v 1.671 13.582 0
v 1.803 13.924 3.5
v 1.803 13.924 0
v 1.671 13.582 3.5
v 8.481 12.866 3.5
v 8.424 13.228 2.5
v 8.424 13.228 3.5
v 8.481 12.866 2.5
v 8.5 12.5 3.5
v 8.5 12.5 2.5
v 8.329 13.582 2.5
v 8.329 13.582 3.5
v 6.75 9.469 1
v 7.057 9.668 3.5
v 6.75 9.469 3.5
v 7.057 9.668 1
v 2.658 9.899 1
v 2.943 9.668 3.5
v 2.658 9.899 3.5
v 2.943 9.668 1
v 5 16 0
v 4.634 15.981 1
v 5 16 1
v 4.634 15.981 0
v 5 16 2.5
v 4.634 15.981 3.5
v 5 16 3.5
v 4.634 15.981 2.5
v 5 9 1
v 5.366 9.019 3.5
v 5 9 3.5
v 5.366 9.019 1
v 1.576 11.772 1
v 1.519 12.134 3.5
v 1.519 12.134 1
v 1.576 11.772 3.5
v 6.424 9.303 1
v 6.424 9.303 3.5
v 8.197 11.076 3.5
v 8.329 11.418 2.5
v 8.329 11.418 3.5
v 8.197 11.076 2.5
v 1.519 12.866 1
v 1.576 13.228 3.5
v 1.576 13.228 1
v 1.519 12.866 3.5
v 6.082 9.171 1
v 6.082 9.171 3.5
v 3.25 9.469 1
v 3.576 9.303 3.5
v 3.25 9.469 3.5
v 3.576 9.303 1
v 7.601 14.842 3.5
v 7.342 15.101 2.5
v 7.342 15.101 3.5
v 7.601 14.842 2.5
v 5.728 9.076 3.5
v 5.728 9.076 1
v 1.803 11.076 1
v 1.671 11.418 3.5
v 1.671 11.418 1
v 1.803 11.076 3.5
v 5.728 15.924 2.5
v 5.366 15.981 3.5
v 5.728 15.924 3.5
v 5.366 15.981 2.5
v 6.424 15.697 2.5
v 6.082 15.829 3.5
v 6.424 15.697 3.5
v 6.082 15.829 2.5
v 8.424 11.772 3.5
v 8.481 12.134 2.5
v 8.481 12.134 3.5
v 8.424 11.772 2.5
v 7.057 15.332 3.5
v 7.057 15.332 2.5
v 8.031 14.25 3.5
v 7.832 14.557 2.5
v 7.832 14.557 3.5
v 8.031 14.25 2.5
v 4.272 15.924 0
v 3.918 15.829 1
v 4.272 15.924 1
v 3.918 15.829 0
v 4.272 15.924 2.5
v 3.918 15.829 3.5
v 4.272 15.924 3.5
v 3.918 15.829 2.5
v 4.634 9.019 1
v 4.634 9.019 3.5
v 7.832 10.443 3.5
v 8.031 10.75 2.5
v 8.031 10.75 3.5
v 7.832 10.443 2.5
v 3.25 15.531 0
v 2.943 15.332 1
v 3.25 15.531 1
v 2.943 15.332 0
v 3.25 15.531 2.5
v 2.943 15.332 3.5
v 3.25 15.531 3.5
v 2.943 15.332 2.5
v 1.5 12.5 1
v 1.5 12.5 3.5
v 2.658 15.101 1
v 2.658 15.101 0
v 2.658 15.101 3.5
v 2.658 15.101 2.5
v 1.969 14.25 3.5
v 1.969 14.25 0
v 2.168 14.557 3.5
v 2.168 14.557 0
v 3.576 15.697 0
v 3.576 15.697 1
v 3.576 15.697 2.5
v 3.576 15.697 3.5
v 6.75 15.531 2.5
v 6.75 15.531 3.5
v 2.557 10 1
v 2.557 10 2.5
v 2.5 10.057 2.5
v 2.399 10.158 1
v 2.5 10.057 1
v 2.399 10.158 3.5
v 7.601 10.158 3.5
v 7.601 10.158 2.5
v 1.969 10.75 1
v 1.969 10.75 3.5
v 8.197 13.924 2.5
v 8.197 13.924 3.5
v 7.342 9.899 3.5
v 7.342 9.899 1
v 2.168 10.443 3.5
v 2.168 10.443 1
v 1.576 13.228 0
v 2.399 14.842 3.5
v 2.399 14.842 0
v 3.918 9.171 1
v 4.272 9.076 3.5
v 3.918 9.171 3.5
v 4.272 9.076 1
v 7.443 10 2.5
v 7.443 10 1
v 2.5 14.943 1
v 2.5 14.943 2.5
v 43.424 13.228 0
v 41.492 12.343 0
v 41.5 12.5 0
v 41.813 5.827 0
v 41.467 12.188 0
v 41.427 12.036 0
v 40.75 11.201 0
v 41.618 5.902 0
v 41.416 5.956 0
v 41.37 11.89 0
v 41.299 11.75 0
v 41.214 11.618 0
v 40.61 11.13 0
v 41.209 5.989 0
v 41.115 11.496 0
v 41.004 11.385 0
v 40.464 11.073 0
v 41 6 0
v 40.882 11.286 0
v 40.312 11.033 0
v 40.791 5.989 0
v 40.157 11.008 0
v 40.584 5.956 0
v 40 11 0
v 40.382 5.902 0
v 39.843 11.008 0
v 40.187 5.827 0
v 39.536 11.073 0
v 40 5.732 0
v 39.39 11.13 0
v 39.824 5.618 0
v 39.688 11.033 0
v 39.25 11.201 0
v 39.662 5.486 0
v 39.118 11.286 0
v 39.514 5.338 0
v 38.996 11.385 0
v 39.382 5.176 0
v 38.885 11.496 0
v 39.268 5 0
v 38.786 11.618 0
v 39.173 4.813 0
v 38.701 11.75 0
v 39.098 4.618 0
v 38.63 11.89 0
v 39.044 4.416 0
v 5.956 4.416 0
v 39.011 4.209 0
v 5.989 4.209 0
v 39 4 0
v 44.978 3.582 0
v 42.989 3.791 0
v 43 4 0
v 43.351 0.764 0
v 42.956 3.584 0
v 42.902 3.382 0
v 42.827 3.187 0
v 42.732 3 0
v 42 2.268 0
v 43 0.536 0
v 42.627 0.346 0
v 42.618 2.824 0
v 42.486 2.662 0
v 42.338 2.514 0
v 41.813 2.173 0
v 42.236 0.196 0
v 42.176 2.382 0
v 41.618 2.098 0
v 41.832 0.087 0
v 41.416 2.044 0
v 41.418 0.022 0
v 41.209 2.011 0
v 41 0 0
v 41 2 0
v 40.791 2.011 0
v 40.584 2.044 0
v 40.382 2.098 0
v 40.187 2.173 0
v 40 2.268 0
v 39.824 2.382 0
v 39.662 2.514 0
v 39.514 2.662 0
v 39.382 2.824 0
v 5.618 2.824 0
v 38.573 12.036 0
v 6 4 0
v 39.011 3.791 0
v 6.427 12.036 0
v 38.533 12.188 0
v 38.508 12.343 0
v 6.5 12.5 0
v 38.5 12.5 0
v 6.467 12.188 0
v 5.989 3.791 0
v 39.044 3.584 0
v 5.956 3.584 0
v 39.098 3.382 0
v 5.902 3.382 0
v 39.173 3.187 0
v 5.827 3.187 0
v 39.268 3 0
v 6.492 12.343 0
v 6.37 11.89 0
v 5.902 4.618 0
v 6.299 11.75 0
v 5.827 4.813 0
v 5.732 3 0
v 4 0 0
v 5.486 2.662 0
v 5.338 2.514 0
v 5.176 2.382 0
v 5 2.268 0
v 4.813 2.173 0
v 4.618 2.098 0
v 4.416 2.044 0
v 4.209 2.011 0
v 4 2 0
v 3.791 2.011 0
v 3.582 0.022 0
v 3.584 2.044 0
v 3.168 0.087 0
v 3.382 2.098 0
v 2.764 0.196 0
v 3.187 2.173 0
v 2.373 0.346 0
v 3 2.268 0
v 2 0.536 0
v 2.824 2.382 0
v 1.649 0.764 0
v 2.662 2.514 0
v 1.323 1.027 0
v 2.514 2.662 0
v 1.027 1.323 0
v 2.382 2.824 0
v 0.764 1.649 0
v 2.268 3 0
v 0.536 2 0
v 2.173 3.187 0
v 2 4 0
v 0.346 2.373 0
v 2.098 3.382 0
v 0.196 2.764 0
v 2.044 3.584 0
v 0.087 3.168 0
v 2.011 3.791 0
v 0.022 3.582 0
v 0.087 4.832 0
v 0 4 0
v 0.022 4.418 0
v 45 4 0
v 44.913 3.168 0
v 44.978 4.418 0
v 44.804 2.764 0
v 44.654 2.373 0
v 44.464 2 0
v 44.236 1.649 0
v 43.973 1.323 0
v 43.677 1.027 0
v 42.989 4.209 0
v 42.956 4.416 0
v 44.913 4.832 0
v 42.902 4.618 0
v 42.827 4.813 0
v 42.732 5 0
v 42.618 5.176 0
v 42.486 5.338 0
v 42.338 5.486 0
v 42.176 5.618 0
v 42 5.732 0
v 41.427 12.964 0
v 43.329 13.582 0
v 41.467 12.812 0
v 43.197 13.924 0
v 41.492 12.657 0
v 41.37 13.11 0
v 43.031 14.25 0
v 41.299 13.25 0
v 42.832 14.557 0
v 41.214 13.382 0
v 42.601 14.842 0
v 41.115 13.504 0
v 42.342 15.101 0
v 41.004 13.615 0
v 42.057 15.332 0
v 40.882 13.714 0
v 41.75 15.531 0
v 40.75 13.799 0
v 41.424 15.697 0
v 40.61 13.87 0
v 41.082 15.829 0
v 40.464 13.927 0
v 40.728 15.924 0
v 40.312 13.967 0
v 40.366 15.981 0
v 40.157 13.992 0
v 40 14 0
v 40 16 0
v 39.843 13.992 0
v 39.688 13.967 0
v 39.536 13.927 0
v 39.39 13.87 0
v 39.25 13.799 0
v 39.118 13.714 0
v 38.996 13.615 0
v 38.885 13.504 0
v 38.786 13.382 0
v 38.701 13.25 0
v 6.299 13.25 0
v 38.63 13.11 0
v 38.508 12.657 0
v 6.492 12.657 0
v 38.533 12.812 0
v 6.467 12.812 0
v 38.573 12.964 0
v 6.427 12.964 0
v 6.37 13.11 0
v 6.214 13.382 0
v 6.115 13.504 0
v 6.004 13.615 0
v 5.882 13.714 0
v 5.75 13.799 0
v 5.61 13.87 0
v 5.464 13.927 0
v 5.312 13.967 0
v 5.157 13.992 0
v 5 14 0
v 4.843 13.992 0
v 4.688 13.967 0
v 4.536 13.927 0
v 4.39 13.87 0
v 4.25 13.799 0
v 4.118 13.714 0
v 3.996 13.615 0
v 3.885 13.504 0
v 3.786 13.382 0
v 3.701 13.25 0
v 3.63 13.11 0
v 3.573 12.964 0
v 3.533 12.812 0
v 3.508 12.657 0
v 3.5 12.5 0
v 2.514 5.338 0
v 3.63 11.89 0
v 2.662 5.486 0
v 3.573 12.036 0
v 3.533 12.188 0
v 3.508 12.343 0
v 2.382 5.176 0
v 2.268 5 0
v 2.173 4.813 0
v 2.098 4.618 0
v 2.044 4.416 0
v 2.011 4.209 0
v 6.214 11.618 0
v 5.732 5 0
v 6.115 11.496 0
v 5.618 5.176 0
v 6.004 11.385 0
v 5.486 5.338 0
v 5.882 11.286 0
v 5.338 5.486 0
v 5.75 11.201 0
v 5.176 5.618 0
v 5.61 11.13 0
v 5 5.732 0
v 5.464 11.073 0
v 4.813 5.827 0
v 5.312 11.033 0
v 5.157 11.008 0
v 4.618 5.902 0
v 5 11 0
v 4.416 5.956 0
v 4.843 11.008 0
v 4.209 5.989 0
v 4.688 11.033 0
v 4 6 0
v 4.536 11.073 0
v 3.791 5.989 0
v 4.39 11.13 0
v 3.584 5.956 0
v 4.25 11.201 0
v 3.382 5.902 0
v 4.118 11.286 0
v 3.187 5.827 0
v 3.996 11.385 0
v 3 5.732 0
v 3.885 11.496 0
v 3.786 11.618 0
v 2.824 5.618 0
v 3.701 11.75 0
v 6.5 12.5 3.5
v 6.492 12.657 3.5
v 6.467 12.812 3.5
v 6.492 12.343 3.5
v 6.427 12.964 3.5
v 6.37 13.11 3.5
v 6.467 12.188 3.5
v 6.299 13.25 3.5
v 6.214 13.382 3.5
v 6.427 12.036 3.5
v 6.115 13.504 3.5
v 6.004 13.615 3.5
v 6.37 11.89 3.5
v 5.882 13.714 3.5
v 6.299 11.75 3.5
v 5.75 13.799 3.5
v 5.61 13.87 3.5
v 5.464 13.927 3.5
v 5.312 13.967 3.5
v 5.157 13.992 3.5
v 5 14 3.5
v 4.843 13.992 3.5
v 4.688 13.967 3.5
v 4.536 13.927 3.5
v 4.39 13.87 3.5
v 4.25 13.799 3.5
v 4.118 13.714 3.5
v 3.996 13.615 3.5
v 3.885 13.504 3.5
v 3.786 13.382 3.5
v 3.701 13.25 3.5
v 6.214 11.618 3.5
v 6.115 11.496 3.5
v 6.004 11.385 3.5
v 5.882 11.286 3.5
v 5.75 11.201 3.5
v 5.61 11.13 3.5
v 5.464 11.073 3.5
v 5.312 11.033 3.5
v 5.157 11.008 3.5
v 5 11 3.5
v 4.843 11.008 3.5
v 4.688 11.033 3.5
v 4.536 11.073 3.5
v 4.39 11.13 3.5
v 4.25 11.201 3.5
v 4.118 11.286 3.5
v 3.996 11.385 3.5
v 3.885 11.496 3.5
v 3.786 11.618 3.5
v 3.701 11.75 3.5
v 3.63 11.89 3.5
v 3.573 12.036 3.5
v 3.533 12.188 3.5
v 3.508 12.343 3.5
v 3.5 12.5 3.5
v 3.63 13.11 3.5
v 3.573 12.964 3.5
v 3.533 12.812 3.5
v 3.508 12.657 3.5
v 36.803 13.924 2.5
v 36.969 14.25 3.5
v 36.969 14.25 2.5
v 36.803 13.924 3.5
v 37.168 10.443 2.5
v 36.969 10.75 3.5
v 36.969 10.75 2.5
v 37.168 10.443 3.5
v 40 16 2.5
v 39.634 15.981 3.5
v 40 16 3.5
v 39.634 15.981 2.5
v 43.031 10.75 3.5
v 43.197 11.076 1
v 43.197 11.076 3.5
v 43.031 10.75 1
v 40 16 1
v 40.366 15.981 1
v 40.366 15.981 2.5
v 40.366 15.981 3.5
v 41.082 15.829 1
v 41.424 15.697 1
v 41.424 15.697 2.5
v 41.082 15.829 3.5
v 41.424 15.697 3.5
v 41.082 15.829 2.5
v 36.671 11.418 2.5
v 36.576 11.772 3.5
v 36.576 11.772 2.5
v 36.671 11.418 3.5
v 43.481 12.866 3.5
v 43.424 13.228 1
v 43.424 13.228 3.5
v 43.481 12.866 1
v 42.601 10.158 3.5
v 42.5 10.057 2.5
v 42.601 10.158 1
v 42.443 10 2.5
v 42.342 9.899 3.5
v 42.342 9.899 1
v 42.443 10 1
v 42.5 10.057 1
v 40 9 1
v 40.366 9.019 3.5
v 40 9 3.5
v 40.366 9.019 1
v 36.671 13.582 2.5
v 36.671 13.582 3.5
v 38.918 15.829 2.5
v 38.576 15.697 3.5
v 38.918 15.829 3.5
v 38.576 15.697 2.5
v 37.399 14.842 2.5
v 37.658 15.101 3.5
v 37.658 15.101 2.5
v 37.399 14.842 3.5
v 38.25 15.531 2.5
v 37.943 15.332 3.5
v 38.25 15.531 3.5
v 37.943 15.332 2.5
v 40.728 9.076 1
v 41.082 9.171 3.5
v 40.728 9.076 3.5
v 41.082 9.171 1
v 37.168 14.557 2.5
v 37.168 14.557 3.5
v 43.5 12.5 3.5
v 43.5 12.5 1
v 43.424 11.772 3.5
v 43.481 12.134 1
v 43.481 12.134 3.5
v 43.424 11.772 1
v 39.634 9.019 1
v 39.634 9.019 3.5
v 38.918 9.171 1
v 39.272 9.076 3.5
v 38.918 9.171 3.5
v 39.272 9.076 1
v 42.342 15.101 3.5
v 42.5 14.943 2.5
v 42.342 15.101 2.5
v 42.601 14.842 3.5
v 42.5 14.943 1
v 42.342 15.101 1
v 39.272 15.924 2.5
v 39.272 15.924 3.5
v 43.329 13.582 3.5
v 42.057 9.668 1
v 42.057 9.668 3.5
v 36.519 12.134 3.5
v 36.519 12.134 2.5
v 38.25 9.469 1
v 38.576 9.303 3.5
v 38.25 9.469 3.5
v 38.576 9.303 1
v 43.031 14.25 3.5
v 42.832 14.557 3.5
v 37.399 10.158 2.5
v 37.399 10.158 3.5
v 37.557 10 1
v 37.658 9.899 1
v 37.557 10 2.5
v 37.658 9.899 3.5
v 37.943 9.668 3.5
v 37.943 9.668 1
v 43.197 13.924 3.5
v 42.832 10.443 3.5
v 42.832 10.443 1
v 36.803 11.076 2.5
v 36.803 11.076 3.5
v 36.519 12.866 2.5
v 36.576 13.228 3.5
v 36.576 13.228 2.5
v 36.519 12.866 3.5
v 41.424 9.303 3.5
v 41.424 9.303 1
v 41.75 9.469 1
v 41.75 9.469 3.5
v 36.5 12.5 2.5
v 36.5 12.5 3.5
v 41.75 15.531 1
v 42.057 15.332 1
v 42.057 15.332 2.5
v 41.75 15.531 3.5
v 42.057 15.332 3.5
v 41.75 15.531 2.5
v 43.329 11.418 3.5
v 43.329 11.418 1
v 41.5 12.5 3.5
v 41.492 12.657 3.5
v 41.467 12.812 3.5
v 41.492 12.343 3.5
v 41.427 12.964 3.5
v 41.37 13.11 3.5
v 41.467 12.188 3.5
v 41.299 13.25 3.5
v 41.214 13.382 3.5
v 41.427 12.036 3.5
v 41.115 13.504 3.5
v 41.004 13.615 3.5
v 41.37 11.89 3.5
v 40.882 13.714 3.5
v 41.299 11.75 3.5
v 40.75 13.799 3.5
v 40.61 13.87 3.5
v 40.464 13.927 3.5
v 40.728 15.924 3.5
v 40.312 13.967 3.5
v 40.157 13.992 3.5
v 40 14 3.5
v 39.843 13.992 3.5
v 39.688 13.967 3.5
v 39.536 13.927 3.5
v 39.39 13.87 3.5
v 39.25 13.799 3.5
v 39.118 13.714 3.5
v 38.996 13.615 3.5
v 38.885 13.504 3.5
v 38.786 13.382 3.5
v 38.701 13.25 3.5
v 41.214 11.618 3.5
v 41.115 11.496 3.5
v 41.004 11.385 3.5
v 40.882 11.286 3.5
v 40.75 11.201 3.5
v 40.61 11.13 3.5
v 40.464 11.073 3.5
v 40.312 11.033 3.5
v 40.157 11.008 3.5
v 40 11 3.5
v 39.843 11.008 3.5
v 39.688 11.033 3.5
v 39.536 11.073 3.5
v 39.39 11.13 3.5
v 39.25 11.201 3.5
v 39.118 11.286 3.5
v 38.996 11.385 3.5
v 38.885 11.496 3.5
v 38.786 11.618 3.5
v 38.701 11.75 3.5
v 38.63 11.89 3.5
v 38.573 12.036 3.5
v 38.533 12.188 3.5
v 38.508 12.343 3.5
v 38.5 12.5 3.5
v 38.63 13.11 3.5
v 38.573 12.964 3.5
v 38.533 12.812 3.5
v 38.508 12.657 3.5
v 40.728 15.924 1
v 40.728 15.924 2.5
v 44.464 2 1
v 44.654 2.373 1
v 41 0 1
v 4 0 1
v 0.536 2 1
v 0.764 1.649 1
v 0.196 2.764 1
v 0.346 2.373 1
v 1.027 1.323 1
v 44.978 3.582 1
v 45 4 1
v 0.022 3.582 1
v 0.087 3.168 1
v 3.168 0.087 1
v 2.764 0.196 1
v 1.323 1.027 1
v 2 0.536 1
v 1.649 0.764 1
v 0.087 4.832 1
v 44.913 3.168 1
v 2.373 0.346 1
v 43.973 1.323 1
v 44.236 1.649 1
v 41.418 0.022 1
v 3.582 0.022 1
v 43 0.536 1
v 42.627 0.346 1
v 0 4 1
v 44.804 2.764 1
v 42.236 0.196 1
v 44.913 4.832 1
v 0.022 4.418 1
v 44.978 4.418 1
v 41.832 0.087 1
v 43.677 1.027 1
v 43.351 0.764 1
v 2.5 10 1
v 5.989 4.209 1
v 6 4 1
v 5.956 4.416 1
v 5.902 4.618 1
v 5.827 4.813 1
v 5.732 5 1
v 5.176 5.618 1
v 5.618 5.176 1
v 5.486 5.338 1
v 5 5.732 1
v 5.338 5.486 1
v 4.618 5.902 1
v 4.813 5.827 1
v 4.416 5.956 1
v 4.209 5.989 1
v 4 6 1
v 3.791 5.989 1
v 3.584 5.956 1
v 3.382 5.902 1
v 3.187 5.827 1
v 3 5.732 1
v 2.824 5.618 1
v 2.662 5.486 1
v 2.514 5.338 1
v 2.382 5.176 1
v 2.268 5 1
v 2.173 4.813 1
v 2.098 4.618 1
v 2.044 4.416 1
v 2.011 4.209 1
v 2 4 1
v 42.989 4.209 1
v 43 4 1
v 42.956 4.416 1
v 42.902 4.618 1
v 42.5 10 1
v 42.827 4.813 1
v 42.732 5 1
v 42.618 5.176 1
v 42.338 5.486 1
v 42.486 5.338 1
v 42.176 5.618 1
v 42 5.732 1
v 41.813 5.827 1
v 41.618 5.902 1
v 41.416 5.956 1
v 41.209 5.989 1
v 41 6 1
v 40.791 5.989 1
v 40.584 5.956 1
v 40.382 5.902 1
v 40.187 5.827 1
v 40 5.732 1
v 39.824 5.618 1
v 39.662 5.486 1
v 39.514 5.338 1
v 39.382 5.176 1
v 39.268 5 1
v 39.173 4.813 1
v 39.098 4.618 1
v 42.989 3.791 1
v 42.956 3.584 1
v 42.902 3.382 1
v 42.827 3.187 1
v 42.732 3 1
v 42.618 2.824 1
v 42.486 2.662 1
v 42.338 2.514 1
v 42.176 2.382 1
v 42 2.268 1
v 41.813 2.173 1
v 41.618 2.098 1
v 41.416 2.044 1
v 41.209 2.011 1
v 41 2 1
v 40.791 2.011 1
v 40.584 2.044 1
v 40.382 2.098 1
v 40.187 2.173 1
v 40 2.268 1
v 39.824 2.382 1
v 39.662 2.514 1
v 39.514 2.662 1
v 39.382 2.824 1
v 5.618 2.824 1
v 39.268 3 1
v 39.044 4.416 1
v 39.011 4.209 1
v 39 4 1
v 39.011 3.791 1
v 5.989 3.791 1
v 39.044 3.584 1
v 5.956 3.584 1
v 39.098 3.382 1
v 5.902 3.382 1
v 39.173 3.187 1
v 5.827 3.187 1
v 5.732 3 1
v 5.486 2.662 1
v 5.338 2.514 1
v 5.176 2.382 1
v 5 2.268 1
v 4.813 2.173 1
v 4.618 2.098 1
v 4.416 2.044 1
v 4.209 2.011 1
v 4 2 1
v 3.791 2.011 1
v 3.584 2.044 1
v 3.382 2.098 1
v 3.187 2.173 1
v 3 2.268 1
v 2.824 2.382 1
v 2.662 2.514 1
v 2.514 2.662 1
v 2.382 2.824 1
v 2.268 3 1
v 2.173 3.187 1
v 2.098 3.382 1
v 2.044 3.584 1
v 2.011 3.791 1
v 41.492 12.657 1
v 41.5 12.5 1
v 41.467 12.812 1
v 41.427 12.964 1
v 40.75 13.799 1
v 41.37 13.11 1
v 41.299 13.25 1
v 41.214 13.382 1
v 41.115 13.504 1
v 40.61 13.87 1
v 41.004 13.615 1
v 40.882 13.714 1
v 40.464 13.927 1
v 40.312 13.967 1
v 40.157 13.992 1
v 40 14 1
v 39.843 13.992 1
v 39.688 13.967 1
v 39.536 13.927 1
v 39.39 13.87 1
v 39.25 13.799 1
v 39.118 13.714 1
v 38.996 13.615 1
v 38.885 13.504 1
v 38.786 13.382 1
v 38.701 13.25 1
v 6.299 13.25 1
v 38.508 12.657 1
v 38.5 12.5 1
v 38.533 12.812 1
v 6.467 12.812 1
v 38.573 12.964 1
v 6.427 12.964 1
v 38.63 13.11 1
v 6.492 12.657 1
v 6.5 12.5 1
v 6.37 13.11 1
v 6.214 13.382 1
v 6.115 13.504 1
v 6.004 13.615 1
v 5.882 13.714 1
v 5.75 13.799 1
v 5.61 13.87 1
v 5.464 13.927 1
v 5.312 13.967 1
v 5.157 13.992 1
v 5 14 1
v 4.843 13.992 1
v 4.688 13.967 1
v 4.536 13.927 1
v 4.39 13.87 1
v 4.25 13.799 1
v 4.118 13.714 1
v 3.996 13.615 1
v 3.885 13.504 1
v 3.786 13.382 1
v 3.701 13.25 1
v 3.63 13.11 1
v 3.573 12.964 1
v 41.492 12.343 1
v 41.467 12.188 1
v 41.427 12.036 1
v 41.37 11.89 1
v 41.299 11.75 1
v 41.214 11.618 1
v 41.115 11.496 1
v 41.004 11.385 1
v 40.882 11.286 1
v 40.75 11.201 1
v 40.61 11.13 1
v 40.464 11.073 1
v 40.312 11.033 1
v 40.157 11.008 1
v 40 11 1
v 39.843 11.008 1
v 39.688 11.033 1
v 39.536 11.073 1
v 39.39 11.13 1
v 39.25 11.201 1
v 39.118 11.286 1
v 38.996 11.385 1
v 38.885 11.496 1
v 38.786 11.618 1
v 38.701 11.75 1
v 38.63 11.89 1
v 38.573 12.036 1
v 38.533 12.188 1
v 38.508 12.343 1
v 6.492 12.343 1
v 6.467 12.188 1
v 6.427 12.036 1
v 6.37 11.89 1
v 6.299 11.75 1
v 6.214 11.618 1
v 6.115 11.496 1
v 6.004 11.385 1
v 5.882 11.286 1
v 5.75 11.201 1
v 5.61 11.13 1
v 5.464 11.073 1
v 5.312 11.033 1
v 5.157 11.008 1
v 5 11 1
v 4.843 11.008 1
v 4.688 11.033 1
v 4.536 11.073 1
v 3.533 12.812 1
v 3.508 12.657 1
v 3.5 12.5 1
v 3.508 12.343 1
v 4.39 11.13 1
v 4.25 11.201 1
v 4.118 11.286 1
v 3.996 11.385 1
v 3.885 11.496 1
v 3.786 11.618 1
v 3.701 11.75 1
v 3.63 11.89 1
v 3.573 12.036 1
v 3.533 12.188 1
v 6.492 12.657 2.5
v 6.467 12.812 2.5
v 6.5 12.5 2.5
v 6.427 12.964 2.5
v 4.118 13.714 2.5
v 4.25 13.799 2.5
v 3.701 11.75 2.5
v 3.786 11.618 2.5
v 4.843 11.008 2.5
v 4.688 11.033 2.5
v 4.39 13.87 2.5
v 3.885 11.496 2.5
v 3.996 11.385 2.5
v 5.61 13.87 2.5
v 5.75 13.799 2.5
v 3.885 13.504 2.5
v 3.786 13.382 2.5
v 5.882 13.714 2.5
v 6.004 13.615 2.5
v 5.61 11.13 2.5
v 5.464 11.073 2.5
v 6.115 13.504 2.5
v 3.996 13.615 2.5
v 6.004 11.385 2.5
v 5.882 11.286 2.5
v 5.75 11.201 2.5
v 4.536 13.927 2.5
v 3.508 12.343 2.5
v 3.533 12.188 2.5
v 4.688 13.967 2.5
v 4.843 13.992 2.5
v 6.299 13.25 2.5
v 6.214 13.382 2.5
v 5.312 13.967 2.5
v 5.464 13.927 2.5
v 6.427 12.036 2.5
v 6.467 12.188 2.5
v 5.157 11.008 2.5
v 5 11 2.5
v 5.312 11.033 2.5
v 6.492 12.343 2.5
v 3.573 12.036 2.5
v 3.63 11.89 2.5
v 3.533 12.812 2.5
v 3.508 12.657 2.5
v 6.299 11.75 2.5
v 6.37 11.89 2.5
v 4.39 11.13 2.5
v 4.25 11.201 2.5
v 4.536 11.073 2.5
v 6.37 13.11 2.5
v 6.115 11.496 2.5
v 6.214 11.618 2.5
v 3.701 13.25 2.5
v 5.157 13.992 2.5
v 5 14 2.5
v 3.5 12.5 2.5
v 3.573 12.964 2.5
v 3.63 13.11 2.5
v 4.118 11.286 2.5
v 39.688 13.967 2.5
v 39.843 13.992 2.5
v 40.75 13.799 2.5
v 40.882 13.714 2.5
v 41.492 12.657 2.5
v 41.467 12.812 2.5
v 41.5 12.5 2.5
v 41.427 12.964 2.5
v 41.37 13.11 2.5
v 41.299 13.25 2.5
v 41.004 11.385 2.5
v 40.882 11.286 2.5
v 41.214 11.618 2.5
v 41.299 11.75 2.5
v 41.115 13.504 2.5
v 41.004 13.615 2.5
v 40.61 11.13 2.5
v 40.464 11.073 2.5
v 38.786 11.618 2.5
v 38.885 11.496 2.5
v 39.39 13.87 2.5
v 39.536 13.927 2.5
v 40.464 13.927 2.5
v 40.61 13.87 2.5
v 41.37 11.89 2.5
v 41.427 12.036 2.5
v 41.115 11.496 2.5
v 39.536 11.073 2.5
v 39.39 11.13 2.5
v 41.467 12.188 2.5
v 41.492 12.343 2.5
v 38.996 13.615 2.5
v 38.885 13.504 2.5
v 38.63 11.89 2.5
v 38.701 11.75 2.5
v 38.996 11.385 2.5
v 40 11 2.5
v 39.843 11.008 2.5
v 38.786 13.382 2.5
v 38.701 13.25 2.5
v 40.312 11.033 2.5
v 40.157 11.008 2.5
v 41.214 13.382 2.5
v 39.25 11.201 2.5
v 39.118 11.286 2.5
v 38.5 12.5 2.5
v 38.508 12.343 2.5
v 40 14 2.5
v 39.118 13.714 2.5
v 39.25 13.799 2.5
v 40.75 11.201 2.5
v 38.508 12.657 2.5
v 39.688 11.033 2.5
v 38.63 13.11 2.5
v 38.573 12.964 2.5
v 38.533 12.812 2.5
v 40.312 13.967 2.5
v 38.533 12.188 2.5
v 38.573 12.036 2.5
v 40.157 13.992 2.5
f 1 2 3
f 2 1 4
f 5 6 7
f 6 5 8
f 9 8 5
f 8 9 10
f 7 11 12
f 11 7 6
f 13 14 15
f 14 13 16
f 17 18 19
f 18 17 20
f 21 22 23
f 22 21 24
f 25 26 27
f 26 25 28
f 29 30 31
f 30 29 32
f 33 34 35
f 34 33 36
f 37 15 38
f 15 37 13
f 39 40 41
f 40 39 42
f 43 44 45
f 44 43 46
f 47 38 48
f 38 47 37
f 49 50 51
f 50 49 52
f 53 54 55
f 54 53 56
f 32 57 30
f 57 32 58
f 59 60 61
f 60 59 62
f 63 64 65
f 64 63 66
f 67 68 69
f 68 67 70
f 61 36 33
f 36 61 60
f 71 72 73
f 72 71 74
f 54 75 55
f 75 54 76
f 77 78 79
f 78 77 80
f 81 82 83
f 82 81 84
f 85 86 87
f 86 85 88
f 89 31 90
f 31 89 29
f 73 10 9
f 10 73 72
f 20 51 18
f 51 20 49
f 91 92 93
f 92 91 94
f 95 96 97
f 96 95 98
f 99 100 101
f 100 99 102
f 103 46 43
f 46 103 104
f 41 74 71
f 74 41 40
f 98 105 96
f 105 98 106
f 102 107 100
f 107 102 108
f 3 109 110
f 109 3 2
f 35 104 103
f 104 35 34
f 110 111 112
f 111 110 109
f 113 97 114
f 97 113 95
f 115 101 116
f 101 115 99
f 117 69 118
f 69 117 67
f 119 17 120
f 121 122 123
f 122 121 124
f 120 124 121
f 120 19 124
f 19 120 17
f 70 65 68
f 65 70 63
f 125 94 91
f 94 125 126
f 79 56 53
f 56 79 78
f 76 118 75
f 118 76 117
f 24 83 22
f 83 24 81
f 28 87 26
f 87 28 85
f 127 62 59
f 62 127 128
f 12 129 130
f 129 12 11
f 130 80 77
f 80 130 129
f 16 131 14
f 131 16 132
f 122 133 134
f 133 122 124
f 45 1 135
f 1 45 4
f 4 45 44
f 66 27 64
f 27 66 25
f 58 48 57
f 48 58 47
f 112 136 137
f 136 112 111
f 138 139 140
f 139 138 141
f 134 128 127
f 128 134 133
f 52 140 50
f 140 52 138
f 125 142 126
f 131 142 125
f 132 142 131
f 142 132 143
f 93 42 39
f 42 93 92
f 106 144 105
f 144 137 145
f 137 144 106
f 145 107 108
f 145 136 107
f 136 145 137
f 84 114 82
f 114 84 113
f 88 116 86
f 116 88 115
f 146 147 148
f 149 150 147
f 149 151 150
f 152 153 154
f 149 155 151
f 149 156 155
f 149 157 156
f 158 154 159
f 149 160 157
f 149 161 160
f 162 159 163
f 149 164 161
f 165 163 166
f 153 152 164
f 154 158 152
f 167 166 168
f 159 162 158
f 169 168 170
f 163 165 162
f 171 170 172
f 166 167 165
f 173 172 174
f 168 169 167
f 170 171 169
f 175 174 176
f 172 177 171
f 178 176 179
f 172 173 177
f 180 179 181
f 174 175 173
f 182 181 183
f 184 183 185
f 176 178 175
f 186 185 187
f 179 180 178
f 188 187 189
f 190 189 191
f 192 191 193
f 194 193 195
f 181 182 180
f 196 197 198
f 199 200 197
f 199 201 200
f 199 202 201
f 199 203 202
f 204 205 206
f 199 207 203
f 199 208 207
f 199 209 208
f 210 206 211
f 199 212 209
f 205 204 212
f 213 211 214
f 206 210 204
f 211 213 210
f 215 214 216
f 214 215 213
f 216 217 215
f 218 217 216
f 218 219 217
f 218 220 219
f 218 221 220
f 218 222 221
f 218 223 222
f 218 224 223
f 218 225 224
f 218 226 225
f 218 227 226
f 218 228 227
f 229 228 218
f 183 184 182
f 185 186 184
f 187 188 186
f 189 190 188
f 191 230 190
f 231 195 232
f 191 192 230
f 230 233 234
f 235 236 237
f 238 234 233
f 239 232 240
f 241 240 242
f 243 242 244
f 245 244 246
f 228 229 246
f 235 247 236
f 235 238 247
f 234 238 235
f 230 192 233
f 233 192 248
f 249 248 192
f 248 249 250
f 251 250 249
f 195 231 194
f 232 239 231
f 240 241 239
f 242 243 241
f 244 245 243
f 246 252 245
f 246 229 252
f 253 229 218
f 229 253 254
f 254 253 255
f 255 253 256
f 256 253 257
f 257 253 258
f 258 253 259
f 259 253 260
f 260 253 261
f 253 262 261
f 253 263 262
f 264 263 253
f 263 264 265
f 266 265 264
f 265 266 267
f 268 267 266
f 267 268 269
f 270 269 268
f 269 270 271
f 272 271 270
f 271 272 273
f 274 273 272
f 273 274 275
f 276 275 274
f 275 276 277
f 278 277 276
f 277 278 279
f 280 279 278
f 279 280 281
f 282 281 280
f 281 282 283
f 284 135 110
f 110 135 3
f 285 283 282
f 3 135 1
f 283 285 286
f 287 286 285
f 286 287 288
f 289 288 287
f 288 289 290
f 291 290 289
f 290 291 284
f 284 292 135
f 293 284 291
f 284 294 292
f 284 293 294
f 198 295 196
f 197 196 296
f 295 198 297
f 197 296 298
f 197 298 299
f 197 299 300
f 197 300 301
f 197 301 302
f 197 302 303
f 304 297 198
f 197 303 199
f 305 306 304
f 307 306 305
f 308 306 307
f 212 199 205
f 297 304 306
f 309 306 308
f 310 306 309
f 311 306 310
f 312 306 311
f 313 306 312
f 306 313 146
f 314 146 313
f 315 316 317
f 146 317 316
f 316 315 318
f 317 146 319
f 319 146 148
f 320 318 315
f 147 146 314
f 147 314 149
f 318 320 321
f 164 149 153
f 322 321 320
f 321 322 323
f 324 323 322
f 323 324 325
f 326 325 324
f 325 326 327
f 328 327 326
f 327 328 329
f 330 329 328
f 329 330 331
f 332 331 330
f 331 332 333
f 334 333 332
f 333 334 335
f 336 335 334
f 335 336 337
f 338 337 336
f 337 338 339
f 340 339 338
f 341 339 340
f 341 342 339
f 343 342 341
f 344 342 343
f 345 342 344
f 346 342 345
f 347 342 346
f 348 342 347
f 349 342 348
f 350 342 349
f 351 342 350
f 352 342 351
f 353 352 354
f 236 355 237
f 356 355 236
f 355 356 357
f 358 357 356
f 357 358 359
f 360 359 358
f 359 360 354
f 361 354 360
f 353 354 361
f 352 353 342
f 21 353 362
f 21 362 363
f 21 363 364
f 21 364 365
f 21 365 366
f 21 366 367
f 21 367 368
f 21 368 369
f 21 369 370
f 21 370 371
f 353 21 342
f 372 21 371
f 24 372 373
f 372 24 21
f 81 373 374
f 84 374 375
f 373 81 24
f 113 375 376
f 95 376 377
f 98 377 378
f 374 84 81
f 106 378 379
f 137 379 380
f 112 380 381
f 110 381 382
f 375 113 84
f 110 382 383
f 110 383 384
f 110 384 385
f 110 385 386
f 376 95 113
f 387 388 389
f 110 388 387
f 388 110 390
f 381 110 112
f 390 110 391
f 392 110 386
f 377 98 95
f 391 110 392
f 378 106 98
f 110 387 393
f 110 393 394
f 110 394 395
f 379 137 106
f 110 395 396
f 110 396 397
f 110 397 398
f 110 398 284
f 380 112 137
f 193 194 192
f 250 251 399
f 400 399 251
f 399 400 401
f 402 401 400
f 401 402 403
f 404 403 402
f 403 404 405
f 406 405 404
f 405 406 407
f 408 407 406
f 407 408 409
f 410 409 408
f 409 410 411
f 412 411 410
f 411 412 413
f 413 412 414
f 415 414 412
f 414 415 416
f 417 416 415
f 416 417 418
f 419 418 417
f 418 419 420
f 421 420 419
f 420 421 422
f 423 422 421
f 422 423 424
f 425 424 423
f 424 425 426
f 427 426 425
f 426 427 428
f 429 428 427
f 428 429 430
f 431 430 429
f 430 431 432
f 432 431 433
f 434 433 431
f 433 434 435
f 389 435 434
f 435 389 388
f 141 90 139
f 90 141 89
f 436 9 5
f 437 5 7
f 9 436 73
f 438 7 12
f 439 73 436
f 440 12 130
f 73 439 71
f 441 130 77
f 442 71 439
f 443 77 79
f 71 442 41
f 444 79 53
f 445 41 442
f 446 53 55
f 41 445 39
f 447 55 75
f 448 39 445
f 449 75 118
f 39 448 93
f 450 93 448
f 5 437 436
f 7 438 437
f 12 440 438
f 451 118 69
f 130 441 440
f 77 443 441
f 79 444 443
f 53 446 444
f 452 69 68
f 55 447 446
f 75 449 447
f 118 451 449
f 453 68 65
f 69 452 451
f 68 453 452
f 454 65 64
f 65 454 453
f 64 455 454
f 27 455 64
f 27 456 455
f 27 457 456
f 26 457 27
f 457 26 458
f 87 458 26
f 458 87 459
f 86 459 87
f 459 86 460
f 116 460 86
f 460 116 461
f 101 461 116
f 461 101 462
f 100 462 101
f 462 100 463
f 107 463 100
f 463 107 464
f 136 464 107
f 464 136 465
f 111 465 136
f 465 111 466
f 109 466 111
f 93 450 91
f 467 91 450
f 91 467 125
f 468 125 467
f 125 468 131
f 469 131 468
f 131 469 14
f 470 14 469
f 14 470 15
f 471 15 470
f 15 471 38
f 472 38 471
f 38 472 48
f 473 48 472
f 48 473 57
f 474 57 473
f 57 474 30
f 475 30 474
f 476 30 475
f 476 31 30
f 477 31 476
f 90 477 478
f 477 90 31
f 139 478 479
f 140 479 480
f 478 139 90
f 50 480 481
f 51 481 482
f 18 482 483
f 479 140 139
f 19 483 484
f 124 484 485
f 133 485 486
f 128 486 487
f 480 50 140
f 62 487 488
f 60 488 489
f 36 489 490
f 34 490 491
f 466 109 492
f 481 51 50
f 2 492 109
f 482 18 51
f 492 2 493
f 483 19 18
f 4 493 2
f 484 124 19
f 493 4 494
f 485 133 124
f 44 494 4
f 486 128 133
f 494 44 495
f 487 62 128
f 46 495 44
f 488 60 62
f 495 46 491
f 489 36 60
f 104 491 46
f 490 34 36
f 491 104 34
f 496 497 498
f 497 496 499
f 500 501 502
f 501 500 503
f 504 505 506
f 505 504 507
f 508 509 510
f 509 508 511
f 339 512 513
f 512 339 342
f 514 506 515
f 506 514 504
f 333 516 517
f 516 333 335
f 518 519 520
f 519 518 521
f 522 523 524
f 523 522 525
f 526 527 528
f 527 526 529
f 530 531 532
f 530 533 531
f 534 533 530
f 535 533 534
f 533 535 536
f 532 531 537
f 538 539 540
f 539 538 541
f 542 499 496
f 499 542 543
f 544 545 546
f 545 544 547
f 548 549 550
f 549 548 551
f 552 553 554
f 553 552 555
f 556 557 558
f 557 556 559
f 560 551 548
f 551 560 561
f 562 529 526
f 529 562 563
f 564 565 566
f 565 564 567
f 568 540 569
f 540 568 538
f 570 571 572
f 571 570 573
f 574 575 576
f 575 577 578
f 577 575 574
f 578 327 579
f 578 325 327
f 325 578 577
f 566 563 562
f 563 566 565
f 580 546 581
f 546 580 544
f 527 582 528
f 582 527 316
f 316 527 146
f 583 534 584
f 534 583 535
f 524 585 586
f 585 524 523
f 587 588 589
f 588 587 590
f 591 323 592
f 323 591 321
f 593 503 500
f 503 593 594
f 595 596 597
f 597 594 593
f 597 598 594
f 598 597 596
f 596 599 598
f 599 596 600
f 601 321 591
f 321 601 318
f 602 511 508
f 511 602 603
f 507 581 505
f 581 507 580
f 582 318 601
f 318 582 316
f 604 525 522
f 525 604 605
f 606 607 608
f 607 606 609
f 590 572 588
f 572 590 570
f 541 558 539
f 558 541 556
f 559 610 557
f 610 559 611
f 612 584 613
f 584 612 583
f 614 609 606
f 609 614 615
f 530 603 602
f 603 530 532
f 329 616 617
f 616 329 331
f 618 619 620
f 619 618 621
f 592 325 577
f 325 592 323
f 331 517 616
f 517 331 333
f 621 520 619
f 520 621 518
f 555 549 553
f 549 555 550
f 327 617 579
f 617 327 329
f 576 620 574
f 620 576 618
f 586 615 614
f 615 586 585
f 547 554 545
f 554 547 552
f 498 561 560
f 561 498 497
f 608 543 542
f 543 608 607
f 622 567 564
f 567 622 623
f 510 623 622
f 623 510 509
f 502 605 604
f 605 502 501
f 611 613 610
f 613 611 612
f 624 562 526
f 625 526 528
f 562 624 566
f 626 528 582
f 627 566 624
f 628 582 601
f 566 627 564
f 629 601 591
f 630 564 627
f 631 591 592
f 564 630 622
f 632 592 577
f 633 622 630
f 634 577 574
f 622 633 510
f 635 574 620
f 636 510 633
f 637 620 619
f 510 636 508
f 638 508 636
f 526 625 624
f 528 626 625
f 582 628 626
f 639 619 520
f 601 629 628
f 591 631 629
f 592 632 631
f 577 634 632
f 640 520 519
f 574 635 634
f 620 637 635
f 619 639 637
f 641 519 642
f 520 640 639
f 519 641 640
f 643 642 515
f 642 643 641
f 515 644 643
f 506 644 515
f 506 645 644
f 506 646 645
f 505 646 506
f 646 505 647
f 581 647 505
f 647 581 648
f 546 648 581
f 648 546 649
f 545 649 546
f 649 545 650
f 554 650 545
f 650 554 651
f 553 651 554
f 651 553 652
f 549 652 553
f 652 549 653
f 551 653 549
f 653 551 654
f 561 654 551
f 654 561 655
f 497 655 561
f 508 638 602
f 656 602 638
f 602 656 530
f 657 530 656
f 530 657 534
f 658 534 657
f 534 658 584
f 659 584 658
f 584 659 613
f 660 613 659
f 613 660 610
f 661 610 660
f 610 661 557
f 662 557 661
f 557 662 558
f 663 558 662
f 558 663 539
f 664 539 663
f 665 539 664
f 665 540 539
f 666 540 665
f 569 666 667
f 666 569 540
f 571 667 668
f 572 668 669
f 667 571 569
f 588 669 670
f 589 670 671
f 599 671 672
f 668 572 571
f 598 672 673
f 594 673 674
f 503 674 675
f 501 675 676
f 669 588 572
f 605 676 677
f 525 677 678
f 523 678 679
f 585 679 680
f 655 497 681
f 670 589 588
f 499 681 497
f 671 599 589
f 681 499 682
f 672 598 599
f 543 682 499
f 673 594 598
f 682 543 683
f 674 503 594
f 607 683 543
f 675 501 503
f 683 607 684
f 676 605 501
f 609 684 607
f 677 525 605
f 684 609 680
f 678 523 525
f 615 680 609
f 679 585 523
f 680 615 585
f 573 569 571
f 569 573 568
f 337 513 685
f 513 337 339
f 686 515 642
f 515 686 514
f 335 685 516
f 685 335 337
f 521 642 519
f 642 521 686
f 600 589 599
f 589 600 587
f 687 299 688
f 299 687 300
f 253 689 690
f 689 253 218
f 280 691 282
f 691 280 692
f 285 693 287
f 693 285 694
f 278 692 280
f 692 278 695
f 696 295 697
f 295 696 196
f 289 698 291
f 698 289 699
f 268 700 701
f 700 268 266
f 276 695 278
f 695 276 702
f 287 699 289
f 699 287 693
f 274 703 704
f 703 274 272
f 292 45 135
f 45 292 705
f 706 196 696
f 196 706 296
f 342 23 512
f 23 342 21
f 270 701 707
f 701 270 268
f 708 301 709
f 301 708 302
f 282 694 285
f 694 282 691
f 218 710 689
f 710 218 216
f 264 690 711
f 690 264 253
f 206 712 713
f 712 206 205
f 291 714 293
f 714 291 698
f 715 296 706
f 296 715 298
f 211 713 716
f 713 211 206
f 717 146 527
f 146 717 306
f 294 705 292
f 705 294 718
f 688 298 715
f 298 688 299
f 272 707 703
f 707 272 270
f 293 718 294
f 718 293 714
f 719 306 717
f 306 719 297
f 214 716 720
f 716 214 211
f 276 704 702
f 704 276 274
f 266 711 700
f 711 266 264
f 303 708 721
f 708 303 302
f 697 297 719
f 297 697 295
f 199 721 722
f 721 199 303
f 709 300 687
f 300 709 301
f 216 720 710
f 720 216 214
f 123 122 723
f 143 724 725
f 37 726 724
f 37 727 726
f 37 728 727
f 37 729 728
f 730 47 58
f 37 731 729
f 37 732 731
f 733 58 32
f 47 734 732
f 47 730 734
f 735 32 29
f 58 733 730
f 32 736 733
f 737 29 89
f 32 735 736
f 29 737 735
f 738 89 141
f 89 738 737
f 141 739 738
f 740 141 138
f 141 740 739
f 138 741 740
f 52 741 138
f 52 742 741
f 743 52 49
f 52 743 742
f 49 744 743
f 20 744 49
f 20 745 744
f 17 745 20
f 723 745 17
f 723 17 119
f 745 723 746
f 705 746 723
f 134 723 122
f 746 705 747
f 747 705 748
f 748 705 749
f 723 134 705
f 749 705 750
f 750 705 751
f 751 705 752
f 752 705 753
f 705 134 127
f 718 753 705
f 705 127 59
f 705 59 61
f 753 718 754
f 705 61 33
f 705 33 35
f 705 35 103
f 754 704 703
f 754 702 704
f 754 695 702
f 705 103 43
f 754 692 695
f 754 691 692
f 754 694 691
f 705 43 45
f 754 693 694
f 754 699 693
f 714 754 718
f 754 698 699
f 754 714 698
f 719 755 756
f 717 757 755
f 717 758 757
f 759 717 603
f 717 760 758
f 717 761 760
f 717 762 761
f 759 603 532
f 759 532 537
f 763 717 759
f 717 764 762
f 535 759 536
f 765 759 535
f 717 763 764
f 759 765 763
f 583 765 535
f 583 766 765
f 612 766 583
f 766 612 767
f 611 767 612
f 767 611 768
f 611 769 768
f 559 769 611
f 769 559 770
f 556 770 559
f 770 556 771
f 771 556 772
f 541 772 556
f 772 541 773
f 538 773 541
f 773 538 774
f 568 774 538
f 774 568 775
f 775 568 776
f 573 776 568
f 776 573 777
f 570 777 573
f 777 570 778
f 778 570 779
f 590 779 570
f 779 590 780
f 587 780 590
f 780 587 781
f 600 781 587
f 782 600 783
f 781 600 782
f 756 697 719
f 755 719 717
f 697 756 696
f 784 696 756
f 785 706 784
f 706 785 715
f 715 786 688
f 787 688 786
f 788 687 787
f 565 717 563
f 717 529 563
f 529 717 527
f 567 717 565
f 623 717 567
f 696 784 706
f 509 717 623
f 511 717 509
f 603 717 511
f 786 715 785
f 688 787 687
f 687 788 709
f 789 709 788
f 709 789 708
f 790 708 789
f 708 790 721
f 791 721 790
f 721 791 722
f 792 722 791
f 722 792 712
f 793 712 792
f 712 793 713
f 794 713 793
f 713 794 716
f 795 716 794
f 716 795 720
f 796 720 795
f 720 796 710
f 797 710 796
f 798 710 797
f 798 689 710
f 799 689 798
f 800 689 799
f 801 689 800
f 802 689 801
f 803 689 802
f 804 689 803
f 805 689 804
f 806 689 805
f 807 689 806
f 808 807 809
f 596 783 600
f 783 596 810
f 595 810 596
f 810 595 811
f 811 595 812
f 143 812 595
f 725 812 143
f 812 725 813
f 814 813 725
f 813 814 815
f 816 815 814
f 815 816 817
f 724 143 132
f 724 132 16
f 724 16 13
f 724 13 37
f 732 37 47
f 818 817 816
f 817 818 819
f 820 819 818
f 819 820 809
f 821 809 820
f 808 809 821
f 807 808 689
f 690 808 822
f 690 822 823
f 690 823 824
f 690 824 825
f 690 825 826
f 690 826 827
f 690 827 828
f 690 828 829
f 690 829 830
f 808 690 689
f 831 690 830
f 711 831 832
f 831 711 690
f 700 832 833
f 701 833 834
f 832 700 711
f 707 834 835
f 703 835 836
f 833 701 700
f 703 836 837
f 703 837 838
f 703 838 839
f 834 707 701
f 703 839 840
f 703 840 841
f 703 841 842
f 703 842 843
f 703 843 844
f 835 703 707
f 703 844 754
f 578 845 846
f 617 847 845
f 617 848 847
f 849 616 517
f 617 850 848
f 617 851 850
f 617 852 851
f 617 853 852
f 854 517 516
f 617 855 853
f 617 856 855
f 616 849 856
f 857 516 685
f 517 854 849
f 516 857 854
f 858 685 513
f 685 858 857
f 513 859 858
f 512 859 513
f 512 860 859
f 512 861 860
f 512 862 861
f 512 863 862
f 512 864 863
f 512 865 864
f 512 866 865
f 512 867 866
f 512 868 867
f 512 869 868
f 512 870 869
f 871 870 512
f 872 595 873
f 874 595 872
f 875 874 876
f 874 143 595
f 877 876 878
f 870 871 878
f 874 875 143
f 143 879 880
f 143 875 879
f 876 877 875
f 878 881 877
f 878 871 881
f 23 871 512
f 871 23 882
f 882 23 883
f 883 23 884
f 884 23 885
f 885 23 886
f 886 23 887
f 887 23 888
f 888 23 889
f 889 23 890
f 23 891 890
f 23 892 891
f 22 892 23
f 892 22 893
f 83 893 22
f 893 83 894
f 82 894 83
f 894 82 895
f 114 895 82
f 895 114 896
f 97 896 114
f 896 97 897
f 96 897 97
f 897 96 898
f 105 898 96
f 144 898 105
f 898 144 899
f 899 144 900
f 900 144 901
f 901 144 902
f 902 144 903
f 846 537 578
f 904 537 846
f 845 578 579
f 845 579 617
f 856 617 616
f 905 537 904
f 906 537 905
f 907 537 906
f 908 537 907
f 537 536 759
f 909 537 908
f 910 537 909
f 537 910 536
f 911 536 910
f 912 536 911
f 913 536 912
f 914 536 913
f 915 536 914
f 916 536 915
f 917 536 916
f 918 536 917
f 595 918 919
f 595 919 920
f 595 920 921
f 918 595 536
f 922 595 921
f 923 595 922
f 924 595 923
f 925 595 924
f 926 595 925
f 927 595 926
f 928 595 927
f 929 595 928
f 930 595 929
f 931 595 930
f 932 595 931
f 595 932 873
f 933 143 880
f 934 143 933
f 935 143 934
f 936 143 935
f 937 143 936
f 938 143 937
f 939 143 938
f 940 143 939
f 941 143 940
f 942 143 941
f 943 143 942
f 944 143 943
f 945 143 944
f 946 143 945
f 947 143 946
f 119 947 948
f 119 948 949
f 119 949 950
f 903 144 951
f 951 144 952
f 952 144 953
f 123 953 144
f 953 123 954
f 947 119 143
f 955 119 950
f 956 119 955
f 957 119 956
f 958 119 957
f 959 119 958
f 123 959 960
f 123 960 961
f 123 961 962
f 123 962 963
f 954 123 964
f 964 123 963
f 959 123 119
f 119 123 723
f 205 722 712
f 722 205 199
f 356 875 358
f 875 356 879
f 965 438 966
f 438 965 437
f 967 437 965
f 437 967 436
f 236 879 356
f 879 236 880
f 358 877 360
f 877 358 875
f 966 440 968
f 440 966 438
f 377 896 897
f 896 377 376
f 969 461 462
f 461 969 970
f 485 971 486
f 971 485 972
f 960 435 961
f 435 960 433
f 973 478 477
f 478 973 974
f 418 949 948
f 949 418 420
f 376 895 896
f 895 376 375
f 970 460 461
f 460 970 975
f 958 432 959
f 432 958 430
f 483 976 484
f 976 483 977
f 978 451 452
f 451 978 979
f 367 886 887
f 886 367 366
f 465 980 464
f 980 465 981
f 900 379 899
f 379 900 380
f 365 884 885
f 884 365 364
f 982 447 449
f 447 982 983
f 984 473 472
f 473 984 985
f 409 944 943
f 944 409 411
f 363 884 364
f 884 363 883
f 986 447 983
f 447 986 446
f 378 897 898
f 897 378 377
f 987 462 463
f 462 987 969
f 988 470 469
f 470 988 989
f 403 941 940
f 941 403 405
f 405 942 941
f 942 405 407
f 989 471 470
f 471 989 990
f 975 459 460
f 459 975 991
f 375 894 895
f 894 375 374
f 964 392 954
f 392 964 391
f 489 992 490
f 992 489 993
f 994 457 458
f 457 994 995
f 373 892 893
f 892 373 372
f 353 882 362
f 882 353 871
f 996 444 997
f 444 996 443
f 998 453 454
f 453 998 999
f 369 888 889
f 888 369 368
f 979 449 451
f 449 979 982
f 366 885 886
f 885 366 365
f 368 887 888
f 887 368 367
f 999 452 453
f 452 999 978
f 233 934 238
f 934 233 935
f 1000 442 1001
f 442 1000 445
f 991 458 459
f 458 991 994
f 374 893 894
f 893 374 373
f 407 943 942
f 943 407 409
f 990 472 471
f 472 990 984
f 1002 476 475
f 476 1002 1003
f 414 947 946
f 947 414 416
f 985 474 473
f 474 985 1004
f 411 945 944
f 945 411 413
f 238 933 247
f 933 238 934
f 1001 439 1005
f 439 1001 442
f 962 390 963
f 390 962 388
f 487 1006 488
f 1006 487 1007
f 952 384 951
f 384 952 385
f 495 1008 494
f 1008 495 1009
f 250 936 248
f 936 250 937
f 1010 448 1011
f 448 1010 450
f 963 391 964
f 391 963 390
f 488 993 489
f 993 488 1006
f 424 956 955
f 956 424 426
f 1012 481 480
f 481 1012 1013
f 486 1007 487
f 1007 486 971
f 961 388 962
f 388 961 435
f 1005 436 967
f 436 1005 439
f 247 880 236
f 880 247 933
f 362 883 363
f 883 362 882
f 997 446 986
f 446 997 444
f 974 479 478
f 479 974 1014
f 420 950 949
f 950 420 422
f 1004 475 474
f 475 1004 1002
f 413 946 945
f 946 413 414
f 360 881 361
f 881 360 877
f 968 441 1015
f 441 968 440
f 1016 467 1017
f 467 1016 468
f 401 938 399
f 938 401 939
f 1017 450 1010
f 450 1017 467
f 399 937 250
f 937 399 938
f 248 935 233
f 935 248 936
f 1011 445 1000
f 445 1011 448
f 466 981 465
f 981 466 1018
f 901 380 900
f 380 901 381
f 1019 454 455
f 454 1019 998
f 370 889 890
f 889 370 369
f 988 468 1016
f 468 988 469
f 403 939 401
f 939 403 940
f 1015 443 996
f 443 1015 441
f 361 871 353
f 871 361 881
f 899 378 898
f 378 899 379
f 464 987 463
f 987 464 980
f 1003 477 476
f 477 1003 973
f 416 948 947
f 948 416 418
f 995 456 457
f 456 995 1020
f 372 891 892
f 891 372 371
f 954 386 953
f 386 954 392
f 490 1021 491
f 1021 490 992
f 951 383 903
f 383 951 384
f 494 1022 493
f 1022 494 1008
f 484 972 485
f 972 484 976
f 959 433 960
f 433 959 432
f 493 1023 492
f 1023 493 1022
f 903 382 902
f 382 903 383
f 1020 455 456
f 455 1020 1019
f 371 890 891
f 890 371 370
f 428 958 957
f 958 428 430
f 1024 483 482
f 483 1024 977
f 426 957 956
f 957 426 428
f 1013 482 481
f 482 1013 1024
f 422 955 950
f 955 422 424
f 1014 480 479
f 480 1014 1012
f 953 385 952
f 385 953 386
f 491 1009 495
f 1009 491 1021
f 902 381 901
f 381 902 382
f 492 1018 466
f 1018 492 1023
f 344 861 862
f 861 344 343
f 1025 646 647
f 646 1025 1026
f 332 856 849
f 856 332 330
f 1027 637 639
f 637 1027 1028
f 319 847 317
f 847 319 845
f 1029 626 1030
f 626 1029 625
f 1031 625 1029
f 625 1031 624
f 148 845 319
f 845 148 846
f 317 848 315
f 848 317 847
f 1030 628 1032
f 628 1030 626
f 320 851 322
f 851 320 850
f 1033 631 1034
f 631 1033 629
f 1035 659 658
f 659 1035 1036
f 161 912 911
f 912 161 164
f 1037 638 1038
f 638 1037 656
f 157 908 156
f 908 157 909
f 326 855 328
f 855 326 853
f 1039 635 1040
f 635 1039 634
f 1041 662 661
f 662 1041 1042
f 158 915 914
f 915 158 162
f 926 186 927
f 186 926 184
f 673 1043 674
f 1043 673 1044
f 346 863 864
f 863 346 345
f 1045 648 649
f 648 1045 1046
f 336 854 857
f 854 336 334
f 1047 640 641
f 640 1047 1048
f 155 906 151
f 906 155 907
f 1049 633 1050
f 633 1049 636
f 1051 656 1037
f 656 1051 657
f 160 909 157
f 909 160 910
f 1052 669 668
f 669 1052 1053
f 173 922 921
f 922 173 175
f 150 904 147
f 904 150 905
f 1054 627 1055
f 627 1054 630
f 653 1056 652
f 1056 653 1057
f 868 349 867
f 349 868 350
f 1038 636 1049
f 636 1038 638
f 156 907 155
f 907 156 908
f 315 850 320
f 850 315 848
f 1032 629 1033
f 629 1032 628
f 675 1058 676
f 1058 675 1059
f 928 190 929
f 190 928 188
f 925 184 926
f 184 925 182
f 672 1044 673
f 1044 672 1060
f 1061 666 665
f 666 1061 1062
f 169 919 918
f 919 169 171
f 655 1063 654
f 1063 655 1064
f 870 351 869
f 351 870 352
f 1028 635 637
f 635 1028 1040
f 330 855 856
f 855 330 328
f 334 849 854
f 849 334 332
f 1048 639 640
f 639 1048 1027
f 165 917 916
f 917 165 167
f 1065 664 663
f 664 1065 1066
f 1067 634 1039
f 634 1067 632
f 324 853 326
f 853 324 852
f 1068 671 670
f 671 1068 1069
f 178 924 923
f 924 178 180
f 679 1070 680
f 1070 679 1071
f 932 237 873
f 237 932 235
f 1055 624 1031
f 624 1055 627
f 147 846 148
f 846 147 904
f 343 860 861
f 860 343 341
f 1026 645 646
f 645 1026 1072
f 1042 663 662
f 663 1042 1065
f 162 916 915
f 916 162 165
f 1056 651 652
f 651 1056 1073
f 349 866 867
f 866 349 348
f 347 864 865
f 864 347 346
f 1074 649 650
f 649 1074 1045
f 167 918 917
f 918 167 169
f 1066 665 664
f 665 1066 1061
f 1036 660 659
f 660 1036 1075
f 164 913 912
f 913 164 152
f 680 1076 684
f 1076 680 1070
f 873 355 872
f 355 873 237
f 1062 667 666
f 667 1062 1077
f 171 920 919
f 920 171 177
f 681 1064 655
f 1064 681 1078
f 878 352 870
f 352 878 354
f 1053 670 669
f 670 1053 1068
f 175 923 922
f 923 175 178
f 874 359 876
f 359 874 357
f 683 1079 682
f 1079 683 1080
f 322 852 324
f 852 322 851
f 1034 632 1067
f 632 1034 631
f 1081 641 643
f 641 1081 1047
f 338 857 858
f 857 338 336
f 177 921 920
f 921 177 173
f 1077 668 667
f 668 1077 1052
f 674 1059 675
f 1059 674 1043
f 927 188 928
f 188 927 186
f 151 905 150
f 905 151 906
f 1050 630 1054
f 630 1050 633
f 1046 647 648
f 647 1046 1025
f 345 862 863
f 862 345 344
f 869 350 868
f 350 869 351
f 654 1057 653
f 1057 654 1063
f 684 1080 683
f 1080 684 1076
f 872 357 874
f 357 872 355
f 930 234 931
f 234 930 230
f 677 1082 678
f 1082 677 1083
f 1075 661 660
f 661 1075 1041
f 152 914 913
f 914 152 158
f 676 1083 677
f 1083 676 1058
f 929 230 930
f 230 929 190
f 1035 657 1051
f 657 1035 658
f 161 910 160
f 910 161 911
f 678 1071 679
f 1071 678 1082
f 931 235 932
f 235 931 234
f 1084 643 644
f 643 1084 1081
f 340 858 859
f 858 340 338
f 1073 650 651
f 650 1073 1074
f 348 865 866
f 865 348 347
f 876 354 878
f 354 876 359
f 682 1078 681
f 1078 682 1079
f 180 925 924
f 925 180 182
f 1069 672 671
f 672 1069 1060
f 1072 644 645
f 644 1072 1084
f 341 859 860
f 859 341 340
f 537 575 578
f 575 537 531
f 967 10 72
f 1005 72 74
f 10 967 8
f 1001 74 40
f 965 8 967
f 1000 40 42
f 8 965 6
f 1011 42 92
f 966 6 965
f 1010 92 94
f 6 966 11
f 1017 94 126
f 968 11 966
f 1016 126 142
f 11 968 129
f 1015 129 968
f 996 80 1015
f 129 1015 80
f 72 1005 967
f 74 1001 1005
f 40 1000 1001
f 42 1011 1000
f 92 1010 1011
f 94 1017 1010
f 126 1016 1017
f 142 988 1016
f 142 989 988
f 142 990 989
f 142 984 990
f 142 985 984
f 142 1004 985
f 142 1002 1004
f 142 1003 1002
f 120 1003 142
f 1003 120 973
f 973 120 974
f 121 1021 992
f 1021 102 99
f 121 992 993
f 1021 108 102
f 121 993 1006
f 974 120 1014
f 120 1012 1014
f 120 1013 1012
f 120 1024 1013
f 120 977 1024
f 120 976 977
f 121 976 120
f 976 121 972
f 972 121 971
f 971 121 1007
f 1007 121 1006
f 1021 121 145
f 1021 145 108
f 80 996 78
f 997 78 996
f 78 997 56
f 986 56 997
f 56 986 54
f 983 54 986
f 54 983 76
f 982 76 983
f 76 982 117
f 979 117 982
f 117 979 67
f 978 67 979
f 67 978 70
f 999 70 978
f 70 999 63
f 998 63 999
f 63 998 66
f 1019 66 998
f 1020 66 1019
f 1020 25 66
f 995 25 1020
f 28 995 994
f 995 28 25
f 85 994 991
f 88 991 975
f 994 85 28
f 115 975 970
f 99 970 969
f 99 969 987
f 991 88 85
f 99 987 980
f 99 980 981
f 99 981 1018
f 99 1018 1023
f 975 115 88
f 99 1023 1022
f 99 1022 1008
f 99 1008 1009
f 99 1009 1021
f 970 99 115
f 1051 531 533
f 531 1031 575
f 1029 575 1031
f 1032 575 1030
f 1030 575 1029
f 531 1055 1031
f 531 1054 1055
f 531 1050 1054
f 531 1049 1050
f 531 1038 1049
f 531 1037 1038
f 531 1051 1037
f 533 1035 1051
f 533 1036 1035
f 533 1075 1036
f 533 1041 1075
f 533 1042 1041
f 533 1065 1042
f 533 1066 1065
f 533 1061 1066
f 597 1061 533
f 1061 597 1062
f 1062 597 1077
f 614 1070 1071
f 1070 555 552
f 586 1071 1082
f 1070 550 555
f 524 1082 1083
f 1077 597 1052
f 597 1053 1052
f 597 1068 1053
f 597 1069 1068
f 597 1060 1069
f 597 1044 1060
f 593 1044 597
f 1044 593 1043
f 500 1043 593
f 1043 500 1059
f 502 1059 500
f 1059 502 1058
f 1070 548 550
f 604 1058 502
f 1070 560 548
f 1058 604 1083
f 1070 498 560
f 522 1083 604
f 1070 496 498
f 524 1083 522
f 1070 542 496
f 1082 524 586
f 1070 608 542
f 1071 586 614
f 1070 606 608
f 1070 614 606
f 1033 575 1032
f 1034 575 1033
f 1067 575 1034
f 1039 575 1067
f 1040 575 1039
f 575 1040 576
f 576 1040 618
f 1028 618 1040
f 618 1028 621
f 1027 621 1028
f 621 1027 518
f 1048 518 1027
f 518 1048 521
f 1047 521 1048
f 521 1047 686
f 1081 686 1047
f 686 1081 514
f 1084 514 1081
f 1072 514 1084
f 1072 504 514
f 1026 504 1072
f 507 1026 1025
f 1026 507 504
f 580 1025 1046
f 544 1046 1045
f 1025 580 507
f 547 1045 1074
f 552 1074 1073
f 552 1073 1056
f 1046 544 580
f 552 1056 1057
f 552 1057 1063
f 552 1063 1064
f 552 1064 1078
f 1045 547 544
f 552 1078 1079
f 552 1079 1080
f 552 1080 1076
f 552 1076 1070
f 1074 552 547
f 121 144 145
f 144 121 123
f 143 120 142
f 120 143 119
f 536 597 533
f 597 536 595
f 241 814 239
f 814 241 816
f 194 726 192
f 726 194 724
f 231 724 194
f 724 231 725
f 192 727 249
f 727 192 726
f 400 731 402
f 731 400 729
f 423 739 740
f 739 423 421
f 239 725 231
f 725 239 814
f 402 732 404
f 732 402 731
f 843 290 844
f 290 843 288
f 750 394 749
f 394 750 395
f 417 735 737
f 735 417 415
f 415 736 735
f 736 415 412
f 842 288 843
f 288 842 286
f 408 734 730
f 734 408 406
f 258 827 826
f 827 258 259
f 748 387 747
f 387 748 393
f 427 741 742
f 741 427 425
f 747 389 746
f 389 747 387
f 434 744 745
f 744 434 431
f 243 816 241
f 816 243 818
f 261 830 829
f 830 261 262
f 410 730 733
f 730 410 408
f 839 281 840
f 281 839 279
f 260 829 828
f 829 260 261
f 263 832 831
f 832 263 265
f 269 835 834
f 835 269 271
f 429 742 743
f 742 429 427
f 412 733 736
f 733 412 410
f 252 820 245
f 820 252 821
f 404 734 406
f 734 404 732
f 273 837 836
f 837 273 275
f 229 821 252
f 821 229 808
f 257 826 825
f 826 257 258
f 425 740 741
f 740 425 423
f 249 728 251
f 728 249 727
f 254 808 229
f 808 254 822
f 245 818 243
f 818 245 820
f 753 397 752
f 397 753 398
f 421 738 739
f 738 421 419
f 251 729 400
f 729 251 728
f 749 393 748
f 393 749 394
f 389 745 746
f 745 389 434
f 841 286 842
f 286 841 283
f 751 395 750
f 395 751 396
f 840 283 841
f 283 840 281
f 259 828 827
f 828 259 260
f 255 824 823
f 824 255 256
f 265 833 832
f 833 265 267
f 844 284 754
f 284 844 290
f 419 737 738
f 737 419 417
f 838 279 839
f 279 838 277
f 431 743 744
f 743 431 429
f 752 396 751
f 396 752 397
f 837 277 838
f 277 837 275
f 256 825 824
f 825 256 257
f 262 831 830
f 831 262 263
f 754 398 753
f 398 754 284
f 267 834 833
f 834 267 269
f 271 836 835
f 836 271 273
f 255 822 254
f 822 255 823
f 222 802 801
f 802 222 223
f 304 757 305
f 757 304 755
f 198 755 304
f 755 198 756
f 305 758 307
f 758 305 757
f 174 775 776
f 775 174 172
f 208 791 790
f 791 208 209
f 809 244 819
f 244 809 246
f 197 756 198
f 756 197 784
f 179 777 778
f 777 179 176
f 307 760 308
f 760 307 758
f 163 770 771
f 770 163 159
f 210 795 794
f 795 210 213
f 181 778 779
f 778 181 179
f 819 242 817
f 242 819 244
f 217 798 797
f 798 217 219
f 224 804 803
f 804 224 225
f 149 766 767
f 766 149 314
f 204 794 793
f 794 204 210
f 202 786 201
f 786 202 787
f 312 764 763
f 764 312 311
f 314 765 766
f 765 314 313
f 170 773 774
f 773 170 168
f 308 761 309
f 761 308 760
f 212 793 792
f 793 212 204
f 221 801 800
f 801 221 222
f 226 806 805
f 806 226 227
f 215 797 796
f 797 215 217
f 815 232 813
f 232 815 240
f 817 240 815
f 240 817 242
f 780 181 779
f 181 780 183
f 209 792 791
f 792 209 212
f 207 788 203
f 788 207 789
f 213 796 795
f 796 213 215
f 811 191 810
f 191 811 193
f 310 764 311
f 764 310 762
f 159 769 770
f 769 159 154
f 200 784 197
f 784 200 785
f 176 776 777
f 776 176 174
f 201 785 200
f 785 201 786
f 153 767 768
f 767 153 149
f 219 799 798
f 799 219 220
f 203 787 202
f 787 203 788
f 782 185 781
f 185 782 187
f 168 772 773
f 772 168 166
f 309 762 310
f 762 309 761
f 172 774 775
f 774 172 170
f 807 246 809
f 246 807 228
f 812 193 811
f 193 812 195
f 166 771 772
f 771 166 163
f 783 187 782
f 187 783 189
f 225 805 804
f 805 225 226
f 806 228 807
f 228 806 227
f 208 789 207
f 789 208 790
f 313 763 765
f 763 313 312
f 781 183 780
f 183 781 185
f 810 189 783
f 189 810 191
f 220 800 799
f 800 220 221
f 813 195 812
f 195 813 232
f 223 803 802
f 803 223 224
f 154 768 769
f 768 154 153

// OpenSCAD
$fn = 60;
padding = .1;

pcb_hole_dist = 35;
pcb_hole_r = 1.5;
pcb_w = 40;
module pcb_holes() {
	translate([2.5,2.5,-15]) {
		cylinder(r=pcb_hole_r, h=20);
		translate([pcb_hole_dist,0,0]) cylinder(r=pcb_hole_r, h=20);
	}
}

pcb_thickness = 1.5;
module pcb() {
	difference() {
		cube([pcb_w, 50, pcb_thickness]);
		//pcb_holes();
	}
}

//%translate([(mount_peg_dist+((mount_margin_xy+mount_hole_r)*2)-pcb_w)/2,10,mount_thickness]) pcb();

mount_peg_dist = 37;
mount_hole_r = 2;
mount_margin_xy = 2;
mount_thickness = 1;
difference() {
	translate([mount_margin_xy+mount_hole_r, mount_margin_xy+mount_hole_r, 0]) {
		hull() {
			// Mounting Side
			cylinder(r=mount_margin_xy+mount_hole_r);
			translate([mount_peg_dist, 0, 0]) cylinder(r=mount_margin_xy+mount_hole_r);

			// PCB side
			translate([1,10-pcb_hole_r,0]) {
				cylinder(r=mount_margin_xy+pcb_hole_r);
				translate([pcb_hole_dist, 0, 0]) cylinder(r=mount_margin_xy+pcb_hole_r);
			}
		}

		pcb_side_thickness = (mount_thickness*2)+pcb_thickness;
		translate([1,10-pcb_hole_r,0]) {
			cylinder(r=mount_margin_xy+pcb_hole_r, h=pcb_side_thickness);
			translate([pcb_hole_dist, 0, 0]) cylinder(r=mount_margin_xy+pcb_hole_r, h=pcb_side_thickness);
			//translate([(pcb_w/2)-mount_margin_xy,1-10,0]) cylinder(r=mount_margin_xy+pcb_hole_r, h=mount_thickness);
		}
	}

	translate([(mount_peg_dist+((mount_margin_xy+mount_hole_r)*2)-pcb_w)/2,10,mount_thickness]) {
		pcb_holes();
		pcb();
	}

	/*
	 * Wheat mounting posts
	 * 
	 * These are the posts on the corner with the DC input. The posts are 37mm
	 * apart, and the holes are 4mm.
	 */
	translate([4,4,-padding]) {
		cylinder(r=2, h=mount_thickness+(padding*2));
		translate ([mount_peg_dist,0,0]) cylinder(r=2, h=mount_thickness+(padding*2));
	}
}
